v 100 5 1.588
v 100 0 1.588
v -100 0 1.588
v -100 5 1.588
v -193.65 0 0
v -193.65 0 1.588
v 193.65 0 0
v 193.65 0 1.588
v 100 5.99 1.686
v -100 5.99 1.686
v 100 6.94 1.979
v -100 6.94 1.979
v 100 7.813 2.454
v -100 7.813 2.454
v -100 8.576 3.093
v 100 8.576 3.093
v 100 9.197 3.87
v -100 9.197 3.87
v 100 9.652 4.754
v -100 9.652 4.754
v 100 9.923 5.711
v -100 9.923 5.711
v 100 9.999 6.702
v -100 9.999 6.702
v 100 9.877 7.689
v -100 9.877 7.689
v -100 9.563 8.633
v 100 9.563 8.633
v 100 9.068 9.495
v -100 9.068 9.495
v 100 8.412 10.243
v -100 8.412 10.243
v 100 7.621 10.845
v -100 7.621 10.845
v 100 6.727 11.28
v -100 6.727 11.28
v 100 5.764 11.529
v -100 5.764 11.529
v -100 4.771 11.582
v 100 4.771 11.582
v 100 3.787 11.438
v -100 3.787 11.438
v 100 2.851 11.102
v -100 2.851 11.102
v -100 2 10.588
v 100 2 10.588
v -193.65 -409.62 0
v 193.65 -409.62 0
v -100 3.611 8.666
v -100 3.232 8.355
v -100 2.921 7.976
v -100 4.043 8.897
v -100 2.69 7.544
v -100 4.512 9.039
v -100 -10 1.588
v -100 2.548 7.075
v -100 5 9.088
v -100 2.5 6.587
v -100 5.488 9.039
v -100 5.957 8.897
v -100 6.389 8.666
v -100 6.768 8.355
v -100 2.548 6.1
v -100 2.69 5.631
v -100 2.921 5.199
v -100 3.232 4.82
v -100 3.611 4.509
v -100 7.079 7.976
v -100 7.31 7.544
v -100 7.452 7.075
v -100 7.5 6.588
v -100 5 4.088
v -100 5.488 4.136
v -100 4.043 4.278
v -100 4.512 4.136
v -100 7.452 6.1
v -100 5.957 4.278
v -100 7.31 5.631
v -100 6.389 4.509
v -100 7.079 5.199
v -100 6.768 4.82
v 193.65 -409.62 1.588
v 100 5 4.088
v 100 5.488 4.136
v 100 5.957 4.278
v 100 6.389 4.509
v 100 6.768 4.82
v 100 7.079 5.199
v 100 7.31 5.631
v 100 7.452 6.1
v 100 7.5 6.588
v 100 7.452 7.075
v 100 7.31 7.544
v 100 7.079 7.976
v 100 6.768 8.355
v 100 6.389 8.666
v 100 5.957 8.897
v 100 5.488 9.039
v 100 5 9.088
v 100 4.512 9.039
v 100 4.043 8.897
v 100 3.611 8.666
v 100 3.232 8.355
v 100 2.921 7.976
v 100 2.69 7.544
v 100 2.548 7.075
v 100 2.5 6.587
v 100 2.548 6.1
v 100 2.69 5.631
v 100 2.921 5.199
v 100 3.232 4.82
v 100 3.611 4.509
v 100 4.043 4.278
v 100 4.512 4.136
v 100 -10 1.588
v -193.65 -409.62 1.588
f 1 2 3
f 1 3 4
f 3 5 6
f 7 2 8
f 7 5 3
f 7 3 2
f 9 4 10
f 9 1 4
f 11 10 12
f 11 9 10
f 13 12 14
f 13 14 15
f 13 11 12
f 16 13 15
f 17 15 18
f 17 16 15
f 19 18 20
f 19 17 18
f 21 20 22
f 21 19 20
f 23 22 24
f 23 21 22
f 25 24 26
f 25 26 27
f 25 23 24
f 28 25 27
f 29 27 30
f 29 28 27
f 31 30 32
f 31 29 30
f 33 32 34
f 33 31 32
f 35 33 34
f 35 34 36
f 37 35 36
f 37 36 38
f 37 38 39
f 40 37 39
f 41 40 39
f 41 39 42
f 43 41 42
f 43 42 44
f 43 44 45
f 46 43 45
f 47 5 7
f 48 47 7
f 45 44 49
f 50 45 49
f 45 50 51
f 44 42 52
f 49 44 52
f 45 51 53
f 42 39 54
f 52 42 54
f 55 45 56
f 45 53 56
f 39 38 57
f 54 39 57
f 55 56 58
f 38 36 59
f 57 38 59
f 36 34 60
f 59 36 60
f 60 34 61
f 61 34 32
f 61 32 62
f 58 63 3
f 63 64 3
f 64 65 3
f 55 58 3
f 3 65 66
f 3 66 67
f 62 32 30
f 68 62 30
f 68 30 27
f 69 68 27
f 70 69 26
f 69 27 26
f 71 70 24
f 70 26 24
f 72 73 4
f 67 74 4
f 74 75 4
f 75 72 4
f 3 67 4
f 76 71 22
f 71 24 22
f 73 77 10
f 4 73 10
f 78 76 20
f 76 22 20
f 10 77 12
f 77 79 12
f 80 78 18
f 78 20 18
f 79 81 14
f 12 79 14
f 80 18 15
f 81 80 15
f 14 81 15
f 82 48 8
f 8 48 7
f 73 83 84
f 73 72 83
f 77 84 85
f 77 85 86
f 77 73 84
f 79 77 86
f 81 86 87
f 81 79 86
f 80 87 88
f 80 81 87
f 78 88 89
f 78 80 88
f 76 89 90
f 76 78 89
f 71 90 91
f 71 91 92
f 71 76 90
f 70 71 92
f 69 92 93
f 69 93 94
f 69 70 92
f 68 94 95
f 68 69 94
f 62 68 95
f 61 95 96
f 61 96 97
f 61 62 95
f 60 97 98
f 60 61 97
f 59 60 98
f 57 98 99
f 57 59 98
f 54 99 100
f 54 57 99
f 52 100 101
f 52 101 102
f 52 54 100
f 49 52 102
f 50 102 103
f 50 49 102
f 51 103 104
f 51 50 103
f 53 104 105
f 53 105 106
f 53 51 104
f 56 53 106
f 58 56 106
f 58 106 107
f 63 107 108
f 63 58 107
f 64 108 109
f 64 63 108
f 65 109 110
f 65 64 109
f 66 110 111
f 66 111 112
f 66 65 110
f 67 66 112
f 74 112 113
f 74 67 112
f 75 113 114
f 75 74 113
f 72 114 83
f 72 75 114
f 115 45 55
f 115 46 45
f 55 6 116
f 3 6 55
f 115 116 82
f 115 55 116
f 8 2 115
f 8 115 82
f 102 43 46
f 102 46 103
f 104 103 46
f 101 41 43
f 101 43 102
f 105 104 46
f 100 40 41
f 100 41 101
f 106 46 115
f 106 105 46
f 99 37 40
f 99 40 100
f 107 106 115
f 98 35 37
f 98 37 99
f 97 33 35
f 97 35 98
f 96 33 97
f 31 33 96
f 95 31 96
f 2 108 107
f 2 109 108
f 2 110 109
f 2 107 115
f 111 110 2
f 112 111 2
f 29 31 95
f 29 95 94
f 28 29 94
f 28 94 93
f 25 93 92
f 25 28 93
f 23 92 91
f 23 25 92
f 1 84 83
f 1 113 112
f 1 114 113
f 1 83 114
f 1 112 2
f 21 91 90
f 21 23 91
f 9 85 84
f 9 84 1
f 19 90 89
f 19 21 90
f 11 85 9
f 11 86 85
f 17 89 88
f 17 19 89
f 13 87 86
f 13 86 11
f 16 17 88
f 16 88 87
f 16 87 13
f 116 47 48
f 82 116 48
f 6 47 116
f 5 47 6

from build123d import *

# Parameters (mm, degrees)
SKETCH1_W           = 387.3
SKETCH1_H           = 409.62
BOSS_EXTRUDE1_DEPTH = 1.5875
SKETCH2_R           = 2.5
BOSS_EXTRUDE3_DEPTH = 100


with BuildPart() as part:
    # Sketch1 → Boss-Extrude1 (new body)
    with BuildSketch(Plane.XY):
        with Locations((0, -204.81)):
            Rectangle(SKETCH1_W, SKETCH1_H)
    extrude(amount=BOSS_EXTRUDE1_DEPTH)

    # Sketch2 → Boss-Extrude3 (add, symmetric)
    with BuildSketch(Plane(origin=(0, 0, 0), x_dir=(0, 0, -1), z_dir=(1, 0, 0))):
        with BuildLine():
            Line((-10.5875, 2), (-1.5875, -10))
            Line((-1.5875, -10), (-1.5875, 5))
            ThreePointArc((-1.5875, 5), (-8.16863883, 9.74341649), (-10.5875, 2))
        make_face()
        with Locations((-6.5875, 5)):
            Circle(SKETCH2_R, mode=Mode.SUBTRACT)
    extrude(amount=BOSS_EXTRUDE3_DEPTH, both=True)


solid = part.part
